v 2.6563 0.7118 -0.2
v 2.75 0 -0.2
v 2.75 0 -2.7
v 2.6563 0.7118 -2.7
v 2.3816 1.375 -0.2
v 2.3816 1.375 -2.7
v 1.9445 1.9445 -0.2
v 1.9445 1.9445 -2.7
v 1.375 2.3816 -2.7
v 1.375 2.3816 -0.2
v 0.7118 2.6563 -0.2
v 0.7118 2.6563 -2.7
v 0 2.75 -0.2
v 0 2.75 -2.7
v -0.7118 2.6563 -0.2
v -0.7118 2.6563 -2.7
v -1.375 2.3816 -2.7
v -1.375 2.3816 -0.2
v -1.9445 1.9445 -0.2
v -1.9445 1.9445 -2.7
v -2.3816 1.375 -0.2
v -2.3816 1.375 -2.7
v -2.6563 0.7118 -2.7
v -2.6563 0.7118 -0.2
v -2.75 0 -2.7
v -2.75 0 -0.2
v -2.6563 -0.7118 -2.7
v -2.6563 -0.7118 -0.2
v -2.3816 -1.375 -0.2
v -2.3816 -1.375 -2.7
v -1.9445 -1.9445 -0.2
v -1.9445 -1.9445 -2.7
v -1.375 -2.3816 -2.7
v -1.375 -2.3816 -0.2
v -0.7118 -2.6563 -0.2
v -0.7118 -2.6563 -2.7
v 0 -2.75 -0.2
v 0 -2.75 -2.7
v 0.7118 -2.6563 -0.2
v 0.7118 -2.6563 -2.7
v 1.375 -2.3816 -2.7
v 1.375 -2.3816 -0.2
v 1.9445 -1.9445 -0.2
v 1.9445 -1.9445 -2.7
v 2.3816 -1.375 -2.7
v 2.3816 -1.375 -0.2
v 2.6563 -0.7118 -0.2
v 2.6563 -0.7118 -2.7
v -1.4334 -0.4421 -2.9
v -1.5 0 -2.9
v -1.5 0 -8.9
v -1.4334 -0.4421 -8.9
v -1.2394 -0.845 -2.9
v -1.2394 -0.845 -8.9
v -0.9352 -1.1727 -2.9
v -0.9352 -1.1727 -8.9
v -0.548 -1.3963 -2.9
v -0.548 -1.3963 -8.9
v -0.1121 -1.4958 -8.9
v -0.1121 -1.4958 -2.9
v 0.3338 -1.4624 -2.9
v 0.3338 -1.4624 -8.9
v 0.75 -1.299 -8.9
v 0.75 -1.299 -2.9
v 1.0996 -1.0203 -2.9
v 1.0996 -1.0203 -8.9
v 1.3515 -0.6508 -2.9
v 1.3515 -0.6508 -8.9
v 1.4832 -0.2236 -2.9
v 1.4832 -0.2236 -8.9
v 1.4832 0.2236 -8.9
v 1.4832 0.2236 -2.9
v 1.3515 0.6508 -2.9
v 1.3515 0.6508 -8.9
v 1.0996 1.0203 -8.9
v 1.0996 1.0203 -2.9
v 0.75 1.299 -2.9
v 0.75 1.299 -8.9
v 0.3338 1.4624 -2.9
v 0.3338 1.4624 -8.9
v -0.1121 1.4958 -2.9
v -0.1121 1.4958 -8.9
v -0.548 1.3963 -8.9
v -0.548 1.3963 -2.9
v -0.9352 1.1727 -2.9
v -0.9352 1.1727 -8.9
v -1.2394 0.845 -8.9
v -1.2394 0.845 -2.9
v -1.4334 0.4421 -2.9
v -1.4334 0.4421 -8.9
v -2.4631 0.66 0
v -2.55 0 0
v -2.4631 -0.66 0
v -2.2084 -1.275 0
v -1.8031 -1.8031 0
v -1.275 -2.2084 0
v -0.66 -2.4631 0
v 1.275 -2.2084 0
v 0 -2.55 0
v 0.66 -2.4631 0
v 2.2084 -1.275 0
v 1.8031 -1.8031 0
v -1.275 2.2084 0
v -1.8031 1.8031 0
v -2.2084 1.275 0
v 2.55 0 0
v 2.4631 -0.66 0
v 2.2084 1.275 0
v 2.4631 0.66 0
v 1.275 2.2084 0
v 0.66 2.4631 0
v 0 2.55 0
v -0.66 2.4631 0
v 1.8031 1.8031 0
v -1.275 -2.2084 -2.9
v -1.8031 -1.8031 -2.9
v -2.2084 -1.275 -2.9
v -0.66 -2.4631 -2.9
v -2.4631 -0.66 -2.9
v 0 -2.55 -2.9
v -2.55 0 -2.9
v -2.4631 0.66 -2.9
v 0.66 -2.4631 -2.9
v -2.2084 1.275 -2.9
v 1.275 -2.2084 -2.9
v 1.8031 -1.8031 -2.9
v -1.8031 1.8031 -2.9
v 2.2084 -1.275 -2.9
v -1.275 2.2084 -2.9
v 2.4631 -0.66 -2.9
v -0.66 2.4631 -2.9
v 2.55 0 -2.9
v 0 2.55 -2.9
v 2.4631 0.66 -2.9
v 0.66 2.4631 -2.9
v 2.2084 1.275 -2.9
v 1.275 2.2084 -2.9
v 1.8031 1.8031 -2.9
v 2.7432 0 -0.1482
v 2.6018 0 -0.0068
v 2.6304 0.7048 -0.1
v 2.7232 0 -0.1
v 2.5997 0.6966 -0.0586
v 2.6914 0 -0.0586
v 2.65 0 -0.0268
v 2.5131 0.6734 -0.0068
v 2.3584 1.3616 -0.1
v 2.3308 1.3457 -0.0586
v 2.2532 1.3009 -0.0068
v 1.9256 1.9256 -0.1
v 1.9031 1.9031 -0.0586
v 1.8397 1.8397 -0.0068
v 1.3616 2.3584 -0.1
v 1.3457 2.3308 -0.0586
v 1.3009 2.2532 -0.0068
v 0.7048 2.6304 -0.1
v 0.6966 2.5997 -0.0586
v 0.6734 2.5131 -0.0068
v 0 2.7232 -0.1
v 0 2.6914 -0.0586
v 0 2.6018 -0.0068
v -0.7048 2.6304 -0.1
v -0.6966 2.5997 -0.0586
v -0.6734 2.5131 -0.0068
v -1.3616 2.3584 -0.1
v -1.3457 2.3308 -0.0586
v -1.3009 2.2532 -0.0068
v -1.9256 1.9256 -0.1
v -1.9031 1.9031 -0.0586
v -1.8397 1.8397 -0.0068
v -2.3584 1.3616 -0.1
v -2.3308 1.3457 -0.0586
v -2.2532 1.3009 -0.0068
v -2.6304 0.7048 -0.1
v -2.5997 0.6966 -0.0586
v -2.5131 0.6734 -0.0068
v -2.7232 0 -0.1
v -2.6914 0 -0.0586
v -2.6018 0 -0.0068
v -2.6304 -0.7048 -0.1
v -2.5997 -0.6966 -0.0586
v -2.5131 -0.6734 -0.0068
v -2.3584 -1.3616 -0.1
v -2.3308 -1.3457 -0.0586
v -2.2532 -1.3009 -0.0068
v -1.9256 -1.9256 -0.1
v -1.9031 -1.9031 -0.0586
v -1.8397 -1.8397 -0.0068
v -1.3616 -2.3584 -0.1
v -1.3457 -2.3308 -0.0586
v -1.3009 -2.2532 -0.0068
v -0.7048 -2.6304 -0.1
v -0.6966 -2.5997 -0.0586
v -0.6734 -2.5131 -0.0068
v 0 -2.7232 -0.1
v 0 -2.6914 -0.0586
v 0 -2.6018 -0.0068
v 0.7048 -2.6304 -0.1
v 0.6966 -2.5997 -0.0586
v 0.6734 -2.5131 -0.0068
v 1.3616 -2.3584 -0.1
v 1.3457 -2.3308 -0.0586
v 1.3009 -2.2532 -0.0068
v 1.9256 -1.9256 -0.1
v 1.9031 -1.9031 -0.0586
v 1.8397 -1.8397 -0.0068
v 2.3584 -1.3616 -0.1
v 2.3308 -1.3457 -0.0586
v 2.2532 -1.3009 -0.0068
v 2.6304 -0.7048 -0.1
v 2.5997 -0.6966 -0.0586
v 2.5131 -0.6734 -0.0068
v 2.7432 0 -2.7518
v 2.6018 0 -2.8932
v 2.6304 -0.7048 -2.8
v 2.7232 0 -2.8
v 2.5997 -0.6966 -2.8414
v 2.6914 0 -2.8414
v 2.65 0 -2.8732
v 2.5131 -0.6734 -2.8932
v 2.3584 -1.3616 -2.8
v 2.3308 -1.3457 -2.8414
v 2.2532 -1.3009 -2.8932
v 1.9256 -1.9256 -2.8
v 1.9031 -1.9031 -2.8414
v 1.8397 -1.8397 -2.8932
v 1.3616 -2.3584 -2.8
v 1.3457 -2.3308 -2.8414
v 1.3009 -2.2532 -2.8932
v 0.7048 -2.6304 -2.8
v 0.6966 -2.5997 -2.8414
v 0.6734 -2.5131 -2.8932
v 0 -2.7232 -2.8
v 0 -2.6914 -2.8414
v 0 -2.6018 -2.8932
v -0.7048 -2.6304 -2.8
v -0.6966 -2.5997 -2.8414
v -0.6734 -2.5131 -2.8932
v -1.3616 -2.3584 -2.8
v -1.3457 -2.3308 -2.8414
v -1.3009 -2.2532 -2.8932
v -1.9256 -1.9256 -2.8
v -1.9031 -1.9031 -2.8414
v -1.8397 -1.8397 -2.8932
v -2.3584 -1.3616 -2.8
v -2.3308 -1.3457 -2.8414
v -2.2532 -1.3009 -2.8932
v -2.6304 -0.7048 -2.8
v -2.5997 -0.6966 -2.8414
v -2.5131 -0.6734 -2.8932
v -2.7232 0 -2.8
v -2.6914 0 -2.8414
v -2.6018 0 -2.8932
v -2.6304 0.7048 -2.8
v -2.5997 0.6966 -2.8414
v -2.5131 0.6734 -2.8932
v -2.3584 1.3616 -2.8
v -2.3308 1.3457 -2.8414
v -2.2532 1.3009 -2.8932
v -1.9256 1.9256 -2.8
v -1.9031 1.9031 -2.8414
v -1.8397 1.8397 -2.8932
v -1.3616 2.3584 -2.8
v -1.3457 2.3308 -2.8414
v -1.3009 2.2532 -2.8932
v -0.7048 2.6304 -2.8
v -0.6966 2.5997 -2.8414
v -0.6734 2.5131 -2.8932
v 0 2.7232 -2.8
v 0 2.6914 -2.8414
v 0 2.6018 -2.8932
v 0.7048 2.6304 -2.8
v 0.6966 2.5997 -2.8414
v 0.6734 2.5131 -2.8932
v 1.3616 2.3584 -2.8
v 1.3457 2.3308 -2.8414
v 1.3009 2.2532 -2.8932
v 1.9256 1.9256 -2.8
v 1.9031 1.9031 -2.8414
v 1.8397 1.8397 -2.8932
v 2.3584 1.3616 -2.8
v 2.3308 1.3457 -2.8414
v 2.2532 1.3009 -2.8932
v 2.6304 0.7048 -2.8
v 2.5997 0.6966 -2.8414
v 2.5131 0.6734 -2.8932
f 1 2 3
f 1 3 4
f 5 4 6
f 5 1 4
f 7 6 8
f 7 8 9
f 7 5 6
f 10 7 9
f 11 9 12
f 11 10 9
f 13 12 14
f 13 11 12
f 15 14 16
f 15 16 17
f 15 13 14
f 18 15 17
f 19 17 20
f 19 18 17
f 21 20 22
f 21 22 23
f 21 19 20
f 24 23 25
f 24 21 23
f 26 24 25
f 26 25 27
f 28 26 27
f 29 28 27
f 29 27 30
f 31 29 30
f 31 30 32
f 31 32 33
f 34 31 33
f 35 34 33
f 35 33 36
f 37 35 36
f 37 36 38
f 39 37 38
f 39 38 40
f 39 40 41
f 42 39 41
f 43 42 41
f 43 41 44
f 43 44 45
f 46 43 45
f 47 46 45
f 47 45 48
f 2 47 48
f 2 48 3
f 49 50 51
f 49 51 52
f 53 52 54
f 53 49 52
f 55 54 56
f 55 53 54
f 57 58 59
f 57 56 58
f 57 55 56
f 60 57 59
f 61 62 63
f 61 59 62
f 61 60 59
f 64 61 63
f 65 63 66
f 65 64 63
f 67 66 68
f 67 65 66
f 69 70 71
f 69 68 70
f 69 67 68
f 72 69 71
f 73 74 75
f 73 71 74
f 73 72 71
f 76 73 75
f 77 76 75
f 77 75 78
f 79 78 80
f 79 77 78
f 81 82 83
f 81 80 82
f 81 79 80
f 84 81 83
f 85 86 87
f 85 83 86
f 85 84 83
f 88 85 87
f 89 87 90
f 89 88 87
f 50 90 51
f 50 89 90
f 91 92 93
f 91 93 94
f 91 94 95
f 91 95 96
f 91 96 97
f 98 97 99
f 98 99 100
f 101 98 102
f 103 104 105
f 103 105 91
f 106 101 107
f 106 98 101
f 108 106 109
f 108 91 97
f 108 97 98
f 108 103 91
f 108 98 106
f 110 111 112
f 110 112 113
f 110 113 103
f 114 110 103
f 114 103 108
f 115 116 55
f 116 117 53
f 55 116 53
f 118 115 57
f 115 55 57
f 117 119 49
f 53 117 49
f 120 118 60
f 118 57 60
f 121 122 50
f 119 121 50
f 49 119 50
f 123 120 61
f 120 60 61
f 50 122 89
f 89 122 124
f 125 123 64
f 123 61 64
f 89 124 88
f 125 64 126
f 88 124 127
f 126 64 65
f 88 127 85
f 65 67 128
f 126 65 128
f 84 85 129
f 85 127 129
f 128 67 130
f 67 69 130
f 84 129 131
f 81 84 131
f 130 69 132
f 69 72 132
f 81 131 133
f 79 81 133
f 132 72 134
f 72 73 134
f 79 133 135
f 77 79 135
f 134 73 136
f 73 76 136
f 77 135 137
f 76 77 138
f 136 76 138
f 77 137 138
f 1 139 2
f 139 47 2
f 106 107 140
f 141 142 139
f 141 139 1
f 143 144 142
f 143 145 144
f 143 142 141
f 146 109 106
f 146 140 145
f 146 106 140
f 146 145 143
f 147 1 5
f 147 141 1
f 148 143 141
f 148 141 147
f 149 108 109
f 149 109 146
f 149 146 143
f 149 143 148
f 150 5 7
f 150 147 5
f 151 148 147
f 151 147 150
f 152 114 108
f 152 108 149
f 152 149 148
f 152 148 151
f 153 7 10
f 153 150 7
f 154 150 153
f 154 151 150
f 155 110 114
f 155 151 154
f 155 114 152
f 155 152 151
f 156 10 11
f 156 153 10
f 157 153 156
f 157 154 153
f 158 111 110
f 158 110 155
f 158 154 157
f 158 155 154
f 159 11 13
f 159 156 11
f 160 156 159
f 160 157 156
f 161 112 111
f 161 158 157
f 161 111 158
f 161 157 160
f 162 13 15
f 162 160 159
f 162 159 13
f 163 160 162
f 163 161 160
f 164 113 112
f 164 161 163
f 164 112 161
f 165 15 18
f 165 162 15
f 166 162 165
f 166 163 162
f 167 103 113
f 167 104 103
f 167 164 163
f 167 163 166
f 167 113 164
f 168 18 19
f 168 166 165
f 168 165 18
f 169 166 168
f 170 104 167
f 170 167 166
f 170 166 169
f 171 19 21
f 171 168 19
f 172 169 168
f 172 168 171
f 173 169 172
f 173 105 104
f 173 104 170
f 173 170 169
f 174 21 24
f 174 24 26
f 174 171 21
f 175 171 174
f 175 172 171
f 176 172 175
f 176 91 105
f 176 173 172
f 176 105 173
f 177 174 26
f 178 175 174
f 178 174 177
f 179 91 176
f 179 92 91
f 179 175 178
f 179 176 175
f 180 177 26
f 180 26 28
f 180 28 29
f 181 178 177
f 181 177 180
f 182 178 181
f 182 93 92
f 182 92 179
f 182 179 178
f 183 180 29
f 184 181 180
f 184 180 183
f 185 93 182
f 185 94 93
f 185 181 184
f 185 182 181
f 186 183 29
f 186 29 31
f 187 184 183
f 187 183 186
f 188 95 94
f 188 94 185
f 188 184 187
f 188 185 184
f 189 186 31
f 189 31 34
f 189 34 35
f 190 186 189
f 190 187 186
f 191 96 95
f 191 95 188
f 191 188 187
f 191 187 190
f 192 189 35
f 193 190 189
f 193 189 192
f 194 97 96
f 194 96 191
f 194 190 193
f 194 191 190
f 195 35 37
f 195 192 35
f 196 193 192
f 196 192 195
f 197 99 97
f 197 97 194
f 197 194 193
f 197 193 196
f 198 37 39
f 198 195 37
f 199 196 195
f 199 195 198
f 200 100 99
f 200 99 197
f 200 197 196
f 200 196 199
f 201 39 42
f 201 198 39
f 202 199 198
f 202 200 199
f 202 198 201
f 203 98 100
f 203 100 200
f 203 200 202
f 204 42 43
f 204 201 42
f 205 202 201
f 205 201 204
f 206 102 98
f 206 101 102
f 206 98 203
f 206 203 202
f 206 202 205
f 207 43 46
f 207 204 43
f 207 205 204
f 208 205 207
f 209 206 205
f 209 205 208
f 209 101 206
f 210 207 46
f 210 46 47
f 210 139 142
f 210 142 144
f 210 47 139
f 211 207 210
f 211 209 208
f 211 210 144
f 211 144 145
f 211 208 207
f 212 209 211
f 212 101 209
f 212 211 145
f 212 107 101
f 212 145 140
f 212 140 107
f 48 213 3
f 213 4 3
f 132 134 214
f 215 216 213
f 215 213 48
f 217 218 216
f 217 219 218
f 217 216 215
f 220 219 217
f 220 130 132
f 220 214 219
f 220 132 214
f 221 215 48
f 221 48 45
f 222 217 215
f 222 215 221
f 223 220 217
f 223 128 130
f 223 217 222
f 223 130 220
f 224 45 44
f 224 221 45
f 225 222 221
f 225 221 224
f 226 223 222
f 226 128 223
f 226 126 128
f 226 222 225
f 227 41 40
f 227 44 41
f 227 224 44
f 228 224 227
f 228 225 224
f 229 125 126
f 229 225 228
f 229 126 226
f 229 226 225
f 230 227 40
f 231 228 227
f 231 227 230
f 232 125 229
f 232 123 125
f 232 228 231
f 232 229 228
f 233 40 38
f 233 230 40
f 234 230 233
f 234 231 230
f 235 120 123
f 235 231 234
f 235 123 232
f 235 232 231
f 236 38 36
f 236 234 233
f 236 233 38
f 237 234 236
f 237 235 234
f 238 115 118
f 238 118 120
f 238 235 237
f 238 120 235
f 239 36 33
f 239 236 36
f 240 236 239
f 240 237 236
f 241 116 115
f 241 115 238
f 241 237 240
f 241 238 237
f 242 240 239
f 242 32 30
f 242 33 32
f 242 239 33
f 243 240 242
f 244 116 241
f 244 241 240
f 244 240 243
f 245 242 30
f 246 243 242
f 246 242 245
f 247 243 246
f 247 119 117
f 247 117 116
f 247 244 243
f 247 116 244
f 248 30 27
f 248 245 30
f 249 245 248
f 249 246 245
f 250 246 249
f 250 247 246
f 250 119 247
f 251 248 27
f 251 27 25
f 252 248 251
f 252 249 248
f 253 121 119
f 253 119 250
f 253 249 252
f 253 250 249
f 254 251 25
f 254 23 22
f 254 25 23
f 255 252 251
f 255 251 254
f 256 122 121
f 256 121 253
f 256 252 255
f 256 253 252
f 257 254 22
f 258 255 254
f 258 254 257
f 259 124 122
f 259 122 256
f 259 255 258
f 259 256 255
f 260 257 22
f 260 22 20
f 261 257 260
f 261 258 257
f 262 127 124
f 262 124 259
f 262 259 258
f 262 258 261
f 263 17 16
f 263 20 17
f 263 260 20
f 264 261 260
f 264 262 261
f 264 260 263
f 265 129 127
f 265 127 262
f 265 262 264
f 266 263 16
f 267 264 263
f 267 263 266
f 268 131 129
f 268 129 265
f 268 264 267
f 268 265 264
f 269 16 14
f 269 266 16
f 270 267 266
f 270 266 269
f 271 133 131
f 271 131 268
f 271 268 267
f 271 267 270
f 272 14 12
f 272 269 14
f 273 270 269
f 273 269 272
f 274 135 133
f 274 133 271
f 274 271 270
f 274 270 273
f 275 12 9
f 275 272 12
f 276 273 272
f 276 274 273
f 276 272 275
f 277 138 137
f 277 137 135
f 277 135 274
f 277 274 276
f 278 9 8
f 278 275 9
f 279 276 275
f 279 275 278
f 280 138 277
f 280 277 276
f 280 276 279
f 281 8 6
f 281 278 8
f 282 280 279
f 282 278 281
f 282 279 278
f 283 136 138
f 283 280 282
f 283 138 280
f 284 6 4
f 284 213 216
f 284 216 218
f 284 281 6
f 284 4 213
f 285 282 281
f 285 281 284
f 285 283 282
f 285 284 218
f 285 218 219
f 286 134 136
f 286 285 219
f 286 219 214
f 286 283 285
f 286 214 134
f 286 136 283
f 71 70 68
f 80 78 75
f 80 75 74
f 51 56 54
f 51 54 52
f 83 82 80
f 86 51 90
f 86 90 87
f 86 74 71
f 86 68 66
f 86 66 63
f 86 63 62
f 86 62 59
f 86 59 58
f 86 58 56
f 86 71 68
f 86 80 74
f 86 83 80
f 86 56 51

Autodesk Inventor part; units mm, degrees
ref_plane "YZ Plane" through (0, 0, 0) normal (1, 0, 0) x (0, 1, 0)
ref_plane "XZ Plane" through (0, 0, 0) normal (0, 1, 0) x (-1, 0, 0)
ref_plane "XY Plane" through (0, 0, 0) normal (0, 0, 1) x (1, 0, 0)
sketch "スケッチ1" plane through (0, 0, 0) normal (0, 0, 1) x (1, 0, 0)
  circle A0 centre (0, 0) radius 2.75
  dimension "d0" = 5.5
extrude "押し出し1" add sketch "スケッチ1" against normal blind 2.9
sketch "スケッチ2" plane through (0, 0, -2.9) normal (0, 0, -1) x (-1, 0, 0)
  circle A0 centre (0, 0) radius 1.5
  dimension "d3" = 3
extrude "押し出し2" add sketch "スケッチ2" along normal blind 6
thread "ねじ1" size "M3x0.5" class "6g" standard "ANSI Metric M Profile" full length
fillet "フィレット1" radius 0.2 2 edges at (-2.75, 0, 0) (-2.75, 0, -2.9)
properties part number "M3×6ネジ" material "ステンレス鋼"
